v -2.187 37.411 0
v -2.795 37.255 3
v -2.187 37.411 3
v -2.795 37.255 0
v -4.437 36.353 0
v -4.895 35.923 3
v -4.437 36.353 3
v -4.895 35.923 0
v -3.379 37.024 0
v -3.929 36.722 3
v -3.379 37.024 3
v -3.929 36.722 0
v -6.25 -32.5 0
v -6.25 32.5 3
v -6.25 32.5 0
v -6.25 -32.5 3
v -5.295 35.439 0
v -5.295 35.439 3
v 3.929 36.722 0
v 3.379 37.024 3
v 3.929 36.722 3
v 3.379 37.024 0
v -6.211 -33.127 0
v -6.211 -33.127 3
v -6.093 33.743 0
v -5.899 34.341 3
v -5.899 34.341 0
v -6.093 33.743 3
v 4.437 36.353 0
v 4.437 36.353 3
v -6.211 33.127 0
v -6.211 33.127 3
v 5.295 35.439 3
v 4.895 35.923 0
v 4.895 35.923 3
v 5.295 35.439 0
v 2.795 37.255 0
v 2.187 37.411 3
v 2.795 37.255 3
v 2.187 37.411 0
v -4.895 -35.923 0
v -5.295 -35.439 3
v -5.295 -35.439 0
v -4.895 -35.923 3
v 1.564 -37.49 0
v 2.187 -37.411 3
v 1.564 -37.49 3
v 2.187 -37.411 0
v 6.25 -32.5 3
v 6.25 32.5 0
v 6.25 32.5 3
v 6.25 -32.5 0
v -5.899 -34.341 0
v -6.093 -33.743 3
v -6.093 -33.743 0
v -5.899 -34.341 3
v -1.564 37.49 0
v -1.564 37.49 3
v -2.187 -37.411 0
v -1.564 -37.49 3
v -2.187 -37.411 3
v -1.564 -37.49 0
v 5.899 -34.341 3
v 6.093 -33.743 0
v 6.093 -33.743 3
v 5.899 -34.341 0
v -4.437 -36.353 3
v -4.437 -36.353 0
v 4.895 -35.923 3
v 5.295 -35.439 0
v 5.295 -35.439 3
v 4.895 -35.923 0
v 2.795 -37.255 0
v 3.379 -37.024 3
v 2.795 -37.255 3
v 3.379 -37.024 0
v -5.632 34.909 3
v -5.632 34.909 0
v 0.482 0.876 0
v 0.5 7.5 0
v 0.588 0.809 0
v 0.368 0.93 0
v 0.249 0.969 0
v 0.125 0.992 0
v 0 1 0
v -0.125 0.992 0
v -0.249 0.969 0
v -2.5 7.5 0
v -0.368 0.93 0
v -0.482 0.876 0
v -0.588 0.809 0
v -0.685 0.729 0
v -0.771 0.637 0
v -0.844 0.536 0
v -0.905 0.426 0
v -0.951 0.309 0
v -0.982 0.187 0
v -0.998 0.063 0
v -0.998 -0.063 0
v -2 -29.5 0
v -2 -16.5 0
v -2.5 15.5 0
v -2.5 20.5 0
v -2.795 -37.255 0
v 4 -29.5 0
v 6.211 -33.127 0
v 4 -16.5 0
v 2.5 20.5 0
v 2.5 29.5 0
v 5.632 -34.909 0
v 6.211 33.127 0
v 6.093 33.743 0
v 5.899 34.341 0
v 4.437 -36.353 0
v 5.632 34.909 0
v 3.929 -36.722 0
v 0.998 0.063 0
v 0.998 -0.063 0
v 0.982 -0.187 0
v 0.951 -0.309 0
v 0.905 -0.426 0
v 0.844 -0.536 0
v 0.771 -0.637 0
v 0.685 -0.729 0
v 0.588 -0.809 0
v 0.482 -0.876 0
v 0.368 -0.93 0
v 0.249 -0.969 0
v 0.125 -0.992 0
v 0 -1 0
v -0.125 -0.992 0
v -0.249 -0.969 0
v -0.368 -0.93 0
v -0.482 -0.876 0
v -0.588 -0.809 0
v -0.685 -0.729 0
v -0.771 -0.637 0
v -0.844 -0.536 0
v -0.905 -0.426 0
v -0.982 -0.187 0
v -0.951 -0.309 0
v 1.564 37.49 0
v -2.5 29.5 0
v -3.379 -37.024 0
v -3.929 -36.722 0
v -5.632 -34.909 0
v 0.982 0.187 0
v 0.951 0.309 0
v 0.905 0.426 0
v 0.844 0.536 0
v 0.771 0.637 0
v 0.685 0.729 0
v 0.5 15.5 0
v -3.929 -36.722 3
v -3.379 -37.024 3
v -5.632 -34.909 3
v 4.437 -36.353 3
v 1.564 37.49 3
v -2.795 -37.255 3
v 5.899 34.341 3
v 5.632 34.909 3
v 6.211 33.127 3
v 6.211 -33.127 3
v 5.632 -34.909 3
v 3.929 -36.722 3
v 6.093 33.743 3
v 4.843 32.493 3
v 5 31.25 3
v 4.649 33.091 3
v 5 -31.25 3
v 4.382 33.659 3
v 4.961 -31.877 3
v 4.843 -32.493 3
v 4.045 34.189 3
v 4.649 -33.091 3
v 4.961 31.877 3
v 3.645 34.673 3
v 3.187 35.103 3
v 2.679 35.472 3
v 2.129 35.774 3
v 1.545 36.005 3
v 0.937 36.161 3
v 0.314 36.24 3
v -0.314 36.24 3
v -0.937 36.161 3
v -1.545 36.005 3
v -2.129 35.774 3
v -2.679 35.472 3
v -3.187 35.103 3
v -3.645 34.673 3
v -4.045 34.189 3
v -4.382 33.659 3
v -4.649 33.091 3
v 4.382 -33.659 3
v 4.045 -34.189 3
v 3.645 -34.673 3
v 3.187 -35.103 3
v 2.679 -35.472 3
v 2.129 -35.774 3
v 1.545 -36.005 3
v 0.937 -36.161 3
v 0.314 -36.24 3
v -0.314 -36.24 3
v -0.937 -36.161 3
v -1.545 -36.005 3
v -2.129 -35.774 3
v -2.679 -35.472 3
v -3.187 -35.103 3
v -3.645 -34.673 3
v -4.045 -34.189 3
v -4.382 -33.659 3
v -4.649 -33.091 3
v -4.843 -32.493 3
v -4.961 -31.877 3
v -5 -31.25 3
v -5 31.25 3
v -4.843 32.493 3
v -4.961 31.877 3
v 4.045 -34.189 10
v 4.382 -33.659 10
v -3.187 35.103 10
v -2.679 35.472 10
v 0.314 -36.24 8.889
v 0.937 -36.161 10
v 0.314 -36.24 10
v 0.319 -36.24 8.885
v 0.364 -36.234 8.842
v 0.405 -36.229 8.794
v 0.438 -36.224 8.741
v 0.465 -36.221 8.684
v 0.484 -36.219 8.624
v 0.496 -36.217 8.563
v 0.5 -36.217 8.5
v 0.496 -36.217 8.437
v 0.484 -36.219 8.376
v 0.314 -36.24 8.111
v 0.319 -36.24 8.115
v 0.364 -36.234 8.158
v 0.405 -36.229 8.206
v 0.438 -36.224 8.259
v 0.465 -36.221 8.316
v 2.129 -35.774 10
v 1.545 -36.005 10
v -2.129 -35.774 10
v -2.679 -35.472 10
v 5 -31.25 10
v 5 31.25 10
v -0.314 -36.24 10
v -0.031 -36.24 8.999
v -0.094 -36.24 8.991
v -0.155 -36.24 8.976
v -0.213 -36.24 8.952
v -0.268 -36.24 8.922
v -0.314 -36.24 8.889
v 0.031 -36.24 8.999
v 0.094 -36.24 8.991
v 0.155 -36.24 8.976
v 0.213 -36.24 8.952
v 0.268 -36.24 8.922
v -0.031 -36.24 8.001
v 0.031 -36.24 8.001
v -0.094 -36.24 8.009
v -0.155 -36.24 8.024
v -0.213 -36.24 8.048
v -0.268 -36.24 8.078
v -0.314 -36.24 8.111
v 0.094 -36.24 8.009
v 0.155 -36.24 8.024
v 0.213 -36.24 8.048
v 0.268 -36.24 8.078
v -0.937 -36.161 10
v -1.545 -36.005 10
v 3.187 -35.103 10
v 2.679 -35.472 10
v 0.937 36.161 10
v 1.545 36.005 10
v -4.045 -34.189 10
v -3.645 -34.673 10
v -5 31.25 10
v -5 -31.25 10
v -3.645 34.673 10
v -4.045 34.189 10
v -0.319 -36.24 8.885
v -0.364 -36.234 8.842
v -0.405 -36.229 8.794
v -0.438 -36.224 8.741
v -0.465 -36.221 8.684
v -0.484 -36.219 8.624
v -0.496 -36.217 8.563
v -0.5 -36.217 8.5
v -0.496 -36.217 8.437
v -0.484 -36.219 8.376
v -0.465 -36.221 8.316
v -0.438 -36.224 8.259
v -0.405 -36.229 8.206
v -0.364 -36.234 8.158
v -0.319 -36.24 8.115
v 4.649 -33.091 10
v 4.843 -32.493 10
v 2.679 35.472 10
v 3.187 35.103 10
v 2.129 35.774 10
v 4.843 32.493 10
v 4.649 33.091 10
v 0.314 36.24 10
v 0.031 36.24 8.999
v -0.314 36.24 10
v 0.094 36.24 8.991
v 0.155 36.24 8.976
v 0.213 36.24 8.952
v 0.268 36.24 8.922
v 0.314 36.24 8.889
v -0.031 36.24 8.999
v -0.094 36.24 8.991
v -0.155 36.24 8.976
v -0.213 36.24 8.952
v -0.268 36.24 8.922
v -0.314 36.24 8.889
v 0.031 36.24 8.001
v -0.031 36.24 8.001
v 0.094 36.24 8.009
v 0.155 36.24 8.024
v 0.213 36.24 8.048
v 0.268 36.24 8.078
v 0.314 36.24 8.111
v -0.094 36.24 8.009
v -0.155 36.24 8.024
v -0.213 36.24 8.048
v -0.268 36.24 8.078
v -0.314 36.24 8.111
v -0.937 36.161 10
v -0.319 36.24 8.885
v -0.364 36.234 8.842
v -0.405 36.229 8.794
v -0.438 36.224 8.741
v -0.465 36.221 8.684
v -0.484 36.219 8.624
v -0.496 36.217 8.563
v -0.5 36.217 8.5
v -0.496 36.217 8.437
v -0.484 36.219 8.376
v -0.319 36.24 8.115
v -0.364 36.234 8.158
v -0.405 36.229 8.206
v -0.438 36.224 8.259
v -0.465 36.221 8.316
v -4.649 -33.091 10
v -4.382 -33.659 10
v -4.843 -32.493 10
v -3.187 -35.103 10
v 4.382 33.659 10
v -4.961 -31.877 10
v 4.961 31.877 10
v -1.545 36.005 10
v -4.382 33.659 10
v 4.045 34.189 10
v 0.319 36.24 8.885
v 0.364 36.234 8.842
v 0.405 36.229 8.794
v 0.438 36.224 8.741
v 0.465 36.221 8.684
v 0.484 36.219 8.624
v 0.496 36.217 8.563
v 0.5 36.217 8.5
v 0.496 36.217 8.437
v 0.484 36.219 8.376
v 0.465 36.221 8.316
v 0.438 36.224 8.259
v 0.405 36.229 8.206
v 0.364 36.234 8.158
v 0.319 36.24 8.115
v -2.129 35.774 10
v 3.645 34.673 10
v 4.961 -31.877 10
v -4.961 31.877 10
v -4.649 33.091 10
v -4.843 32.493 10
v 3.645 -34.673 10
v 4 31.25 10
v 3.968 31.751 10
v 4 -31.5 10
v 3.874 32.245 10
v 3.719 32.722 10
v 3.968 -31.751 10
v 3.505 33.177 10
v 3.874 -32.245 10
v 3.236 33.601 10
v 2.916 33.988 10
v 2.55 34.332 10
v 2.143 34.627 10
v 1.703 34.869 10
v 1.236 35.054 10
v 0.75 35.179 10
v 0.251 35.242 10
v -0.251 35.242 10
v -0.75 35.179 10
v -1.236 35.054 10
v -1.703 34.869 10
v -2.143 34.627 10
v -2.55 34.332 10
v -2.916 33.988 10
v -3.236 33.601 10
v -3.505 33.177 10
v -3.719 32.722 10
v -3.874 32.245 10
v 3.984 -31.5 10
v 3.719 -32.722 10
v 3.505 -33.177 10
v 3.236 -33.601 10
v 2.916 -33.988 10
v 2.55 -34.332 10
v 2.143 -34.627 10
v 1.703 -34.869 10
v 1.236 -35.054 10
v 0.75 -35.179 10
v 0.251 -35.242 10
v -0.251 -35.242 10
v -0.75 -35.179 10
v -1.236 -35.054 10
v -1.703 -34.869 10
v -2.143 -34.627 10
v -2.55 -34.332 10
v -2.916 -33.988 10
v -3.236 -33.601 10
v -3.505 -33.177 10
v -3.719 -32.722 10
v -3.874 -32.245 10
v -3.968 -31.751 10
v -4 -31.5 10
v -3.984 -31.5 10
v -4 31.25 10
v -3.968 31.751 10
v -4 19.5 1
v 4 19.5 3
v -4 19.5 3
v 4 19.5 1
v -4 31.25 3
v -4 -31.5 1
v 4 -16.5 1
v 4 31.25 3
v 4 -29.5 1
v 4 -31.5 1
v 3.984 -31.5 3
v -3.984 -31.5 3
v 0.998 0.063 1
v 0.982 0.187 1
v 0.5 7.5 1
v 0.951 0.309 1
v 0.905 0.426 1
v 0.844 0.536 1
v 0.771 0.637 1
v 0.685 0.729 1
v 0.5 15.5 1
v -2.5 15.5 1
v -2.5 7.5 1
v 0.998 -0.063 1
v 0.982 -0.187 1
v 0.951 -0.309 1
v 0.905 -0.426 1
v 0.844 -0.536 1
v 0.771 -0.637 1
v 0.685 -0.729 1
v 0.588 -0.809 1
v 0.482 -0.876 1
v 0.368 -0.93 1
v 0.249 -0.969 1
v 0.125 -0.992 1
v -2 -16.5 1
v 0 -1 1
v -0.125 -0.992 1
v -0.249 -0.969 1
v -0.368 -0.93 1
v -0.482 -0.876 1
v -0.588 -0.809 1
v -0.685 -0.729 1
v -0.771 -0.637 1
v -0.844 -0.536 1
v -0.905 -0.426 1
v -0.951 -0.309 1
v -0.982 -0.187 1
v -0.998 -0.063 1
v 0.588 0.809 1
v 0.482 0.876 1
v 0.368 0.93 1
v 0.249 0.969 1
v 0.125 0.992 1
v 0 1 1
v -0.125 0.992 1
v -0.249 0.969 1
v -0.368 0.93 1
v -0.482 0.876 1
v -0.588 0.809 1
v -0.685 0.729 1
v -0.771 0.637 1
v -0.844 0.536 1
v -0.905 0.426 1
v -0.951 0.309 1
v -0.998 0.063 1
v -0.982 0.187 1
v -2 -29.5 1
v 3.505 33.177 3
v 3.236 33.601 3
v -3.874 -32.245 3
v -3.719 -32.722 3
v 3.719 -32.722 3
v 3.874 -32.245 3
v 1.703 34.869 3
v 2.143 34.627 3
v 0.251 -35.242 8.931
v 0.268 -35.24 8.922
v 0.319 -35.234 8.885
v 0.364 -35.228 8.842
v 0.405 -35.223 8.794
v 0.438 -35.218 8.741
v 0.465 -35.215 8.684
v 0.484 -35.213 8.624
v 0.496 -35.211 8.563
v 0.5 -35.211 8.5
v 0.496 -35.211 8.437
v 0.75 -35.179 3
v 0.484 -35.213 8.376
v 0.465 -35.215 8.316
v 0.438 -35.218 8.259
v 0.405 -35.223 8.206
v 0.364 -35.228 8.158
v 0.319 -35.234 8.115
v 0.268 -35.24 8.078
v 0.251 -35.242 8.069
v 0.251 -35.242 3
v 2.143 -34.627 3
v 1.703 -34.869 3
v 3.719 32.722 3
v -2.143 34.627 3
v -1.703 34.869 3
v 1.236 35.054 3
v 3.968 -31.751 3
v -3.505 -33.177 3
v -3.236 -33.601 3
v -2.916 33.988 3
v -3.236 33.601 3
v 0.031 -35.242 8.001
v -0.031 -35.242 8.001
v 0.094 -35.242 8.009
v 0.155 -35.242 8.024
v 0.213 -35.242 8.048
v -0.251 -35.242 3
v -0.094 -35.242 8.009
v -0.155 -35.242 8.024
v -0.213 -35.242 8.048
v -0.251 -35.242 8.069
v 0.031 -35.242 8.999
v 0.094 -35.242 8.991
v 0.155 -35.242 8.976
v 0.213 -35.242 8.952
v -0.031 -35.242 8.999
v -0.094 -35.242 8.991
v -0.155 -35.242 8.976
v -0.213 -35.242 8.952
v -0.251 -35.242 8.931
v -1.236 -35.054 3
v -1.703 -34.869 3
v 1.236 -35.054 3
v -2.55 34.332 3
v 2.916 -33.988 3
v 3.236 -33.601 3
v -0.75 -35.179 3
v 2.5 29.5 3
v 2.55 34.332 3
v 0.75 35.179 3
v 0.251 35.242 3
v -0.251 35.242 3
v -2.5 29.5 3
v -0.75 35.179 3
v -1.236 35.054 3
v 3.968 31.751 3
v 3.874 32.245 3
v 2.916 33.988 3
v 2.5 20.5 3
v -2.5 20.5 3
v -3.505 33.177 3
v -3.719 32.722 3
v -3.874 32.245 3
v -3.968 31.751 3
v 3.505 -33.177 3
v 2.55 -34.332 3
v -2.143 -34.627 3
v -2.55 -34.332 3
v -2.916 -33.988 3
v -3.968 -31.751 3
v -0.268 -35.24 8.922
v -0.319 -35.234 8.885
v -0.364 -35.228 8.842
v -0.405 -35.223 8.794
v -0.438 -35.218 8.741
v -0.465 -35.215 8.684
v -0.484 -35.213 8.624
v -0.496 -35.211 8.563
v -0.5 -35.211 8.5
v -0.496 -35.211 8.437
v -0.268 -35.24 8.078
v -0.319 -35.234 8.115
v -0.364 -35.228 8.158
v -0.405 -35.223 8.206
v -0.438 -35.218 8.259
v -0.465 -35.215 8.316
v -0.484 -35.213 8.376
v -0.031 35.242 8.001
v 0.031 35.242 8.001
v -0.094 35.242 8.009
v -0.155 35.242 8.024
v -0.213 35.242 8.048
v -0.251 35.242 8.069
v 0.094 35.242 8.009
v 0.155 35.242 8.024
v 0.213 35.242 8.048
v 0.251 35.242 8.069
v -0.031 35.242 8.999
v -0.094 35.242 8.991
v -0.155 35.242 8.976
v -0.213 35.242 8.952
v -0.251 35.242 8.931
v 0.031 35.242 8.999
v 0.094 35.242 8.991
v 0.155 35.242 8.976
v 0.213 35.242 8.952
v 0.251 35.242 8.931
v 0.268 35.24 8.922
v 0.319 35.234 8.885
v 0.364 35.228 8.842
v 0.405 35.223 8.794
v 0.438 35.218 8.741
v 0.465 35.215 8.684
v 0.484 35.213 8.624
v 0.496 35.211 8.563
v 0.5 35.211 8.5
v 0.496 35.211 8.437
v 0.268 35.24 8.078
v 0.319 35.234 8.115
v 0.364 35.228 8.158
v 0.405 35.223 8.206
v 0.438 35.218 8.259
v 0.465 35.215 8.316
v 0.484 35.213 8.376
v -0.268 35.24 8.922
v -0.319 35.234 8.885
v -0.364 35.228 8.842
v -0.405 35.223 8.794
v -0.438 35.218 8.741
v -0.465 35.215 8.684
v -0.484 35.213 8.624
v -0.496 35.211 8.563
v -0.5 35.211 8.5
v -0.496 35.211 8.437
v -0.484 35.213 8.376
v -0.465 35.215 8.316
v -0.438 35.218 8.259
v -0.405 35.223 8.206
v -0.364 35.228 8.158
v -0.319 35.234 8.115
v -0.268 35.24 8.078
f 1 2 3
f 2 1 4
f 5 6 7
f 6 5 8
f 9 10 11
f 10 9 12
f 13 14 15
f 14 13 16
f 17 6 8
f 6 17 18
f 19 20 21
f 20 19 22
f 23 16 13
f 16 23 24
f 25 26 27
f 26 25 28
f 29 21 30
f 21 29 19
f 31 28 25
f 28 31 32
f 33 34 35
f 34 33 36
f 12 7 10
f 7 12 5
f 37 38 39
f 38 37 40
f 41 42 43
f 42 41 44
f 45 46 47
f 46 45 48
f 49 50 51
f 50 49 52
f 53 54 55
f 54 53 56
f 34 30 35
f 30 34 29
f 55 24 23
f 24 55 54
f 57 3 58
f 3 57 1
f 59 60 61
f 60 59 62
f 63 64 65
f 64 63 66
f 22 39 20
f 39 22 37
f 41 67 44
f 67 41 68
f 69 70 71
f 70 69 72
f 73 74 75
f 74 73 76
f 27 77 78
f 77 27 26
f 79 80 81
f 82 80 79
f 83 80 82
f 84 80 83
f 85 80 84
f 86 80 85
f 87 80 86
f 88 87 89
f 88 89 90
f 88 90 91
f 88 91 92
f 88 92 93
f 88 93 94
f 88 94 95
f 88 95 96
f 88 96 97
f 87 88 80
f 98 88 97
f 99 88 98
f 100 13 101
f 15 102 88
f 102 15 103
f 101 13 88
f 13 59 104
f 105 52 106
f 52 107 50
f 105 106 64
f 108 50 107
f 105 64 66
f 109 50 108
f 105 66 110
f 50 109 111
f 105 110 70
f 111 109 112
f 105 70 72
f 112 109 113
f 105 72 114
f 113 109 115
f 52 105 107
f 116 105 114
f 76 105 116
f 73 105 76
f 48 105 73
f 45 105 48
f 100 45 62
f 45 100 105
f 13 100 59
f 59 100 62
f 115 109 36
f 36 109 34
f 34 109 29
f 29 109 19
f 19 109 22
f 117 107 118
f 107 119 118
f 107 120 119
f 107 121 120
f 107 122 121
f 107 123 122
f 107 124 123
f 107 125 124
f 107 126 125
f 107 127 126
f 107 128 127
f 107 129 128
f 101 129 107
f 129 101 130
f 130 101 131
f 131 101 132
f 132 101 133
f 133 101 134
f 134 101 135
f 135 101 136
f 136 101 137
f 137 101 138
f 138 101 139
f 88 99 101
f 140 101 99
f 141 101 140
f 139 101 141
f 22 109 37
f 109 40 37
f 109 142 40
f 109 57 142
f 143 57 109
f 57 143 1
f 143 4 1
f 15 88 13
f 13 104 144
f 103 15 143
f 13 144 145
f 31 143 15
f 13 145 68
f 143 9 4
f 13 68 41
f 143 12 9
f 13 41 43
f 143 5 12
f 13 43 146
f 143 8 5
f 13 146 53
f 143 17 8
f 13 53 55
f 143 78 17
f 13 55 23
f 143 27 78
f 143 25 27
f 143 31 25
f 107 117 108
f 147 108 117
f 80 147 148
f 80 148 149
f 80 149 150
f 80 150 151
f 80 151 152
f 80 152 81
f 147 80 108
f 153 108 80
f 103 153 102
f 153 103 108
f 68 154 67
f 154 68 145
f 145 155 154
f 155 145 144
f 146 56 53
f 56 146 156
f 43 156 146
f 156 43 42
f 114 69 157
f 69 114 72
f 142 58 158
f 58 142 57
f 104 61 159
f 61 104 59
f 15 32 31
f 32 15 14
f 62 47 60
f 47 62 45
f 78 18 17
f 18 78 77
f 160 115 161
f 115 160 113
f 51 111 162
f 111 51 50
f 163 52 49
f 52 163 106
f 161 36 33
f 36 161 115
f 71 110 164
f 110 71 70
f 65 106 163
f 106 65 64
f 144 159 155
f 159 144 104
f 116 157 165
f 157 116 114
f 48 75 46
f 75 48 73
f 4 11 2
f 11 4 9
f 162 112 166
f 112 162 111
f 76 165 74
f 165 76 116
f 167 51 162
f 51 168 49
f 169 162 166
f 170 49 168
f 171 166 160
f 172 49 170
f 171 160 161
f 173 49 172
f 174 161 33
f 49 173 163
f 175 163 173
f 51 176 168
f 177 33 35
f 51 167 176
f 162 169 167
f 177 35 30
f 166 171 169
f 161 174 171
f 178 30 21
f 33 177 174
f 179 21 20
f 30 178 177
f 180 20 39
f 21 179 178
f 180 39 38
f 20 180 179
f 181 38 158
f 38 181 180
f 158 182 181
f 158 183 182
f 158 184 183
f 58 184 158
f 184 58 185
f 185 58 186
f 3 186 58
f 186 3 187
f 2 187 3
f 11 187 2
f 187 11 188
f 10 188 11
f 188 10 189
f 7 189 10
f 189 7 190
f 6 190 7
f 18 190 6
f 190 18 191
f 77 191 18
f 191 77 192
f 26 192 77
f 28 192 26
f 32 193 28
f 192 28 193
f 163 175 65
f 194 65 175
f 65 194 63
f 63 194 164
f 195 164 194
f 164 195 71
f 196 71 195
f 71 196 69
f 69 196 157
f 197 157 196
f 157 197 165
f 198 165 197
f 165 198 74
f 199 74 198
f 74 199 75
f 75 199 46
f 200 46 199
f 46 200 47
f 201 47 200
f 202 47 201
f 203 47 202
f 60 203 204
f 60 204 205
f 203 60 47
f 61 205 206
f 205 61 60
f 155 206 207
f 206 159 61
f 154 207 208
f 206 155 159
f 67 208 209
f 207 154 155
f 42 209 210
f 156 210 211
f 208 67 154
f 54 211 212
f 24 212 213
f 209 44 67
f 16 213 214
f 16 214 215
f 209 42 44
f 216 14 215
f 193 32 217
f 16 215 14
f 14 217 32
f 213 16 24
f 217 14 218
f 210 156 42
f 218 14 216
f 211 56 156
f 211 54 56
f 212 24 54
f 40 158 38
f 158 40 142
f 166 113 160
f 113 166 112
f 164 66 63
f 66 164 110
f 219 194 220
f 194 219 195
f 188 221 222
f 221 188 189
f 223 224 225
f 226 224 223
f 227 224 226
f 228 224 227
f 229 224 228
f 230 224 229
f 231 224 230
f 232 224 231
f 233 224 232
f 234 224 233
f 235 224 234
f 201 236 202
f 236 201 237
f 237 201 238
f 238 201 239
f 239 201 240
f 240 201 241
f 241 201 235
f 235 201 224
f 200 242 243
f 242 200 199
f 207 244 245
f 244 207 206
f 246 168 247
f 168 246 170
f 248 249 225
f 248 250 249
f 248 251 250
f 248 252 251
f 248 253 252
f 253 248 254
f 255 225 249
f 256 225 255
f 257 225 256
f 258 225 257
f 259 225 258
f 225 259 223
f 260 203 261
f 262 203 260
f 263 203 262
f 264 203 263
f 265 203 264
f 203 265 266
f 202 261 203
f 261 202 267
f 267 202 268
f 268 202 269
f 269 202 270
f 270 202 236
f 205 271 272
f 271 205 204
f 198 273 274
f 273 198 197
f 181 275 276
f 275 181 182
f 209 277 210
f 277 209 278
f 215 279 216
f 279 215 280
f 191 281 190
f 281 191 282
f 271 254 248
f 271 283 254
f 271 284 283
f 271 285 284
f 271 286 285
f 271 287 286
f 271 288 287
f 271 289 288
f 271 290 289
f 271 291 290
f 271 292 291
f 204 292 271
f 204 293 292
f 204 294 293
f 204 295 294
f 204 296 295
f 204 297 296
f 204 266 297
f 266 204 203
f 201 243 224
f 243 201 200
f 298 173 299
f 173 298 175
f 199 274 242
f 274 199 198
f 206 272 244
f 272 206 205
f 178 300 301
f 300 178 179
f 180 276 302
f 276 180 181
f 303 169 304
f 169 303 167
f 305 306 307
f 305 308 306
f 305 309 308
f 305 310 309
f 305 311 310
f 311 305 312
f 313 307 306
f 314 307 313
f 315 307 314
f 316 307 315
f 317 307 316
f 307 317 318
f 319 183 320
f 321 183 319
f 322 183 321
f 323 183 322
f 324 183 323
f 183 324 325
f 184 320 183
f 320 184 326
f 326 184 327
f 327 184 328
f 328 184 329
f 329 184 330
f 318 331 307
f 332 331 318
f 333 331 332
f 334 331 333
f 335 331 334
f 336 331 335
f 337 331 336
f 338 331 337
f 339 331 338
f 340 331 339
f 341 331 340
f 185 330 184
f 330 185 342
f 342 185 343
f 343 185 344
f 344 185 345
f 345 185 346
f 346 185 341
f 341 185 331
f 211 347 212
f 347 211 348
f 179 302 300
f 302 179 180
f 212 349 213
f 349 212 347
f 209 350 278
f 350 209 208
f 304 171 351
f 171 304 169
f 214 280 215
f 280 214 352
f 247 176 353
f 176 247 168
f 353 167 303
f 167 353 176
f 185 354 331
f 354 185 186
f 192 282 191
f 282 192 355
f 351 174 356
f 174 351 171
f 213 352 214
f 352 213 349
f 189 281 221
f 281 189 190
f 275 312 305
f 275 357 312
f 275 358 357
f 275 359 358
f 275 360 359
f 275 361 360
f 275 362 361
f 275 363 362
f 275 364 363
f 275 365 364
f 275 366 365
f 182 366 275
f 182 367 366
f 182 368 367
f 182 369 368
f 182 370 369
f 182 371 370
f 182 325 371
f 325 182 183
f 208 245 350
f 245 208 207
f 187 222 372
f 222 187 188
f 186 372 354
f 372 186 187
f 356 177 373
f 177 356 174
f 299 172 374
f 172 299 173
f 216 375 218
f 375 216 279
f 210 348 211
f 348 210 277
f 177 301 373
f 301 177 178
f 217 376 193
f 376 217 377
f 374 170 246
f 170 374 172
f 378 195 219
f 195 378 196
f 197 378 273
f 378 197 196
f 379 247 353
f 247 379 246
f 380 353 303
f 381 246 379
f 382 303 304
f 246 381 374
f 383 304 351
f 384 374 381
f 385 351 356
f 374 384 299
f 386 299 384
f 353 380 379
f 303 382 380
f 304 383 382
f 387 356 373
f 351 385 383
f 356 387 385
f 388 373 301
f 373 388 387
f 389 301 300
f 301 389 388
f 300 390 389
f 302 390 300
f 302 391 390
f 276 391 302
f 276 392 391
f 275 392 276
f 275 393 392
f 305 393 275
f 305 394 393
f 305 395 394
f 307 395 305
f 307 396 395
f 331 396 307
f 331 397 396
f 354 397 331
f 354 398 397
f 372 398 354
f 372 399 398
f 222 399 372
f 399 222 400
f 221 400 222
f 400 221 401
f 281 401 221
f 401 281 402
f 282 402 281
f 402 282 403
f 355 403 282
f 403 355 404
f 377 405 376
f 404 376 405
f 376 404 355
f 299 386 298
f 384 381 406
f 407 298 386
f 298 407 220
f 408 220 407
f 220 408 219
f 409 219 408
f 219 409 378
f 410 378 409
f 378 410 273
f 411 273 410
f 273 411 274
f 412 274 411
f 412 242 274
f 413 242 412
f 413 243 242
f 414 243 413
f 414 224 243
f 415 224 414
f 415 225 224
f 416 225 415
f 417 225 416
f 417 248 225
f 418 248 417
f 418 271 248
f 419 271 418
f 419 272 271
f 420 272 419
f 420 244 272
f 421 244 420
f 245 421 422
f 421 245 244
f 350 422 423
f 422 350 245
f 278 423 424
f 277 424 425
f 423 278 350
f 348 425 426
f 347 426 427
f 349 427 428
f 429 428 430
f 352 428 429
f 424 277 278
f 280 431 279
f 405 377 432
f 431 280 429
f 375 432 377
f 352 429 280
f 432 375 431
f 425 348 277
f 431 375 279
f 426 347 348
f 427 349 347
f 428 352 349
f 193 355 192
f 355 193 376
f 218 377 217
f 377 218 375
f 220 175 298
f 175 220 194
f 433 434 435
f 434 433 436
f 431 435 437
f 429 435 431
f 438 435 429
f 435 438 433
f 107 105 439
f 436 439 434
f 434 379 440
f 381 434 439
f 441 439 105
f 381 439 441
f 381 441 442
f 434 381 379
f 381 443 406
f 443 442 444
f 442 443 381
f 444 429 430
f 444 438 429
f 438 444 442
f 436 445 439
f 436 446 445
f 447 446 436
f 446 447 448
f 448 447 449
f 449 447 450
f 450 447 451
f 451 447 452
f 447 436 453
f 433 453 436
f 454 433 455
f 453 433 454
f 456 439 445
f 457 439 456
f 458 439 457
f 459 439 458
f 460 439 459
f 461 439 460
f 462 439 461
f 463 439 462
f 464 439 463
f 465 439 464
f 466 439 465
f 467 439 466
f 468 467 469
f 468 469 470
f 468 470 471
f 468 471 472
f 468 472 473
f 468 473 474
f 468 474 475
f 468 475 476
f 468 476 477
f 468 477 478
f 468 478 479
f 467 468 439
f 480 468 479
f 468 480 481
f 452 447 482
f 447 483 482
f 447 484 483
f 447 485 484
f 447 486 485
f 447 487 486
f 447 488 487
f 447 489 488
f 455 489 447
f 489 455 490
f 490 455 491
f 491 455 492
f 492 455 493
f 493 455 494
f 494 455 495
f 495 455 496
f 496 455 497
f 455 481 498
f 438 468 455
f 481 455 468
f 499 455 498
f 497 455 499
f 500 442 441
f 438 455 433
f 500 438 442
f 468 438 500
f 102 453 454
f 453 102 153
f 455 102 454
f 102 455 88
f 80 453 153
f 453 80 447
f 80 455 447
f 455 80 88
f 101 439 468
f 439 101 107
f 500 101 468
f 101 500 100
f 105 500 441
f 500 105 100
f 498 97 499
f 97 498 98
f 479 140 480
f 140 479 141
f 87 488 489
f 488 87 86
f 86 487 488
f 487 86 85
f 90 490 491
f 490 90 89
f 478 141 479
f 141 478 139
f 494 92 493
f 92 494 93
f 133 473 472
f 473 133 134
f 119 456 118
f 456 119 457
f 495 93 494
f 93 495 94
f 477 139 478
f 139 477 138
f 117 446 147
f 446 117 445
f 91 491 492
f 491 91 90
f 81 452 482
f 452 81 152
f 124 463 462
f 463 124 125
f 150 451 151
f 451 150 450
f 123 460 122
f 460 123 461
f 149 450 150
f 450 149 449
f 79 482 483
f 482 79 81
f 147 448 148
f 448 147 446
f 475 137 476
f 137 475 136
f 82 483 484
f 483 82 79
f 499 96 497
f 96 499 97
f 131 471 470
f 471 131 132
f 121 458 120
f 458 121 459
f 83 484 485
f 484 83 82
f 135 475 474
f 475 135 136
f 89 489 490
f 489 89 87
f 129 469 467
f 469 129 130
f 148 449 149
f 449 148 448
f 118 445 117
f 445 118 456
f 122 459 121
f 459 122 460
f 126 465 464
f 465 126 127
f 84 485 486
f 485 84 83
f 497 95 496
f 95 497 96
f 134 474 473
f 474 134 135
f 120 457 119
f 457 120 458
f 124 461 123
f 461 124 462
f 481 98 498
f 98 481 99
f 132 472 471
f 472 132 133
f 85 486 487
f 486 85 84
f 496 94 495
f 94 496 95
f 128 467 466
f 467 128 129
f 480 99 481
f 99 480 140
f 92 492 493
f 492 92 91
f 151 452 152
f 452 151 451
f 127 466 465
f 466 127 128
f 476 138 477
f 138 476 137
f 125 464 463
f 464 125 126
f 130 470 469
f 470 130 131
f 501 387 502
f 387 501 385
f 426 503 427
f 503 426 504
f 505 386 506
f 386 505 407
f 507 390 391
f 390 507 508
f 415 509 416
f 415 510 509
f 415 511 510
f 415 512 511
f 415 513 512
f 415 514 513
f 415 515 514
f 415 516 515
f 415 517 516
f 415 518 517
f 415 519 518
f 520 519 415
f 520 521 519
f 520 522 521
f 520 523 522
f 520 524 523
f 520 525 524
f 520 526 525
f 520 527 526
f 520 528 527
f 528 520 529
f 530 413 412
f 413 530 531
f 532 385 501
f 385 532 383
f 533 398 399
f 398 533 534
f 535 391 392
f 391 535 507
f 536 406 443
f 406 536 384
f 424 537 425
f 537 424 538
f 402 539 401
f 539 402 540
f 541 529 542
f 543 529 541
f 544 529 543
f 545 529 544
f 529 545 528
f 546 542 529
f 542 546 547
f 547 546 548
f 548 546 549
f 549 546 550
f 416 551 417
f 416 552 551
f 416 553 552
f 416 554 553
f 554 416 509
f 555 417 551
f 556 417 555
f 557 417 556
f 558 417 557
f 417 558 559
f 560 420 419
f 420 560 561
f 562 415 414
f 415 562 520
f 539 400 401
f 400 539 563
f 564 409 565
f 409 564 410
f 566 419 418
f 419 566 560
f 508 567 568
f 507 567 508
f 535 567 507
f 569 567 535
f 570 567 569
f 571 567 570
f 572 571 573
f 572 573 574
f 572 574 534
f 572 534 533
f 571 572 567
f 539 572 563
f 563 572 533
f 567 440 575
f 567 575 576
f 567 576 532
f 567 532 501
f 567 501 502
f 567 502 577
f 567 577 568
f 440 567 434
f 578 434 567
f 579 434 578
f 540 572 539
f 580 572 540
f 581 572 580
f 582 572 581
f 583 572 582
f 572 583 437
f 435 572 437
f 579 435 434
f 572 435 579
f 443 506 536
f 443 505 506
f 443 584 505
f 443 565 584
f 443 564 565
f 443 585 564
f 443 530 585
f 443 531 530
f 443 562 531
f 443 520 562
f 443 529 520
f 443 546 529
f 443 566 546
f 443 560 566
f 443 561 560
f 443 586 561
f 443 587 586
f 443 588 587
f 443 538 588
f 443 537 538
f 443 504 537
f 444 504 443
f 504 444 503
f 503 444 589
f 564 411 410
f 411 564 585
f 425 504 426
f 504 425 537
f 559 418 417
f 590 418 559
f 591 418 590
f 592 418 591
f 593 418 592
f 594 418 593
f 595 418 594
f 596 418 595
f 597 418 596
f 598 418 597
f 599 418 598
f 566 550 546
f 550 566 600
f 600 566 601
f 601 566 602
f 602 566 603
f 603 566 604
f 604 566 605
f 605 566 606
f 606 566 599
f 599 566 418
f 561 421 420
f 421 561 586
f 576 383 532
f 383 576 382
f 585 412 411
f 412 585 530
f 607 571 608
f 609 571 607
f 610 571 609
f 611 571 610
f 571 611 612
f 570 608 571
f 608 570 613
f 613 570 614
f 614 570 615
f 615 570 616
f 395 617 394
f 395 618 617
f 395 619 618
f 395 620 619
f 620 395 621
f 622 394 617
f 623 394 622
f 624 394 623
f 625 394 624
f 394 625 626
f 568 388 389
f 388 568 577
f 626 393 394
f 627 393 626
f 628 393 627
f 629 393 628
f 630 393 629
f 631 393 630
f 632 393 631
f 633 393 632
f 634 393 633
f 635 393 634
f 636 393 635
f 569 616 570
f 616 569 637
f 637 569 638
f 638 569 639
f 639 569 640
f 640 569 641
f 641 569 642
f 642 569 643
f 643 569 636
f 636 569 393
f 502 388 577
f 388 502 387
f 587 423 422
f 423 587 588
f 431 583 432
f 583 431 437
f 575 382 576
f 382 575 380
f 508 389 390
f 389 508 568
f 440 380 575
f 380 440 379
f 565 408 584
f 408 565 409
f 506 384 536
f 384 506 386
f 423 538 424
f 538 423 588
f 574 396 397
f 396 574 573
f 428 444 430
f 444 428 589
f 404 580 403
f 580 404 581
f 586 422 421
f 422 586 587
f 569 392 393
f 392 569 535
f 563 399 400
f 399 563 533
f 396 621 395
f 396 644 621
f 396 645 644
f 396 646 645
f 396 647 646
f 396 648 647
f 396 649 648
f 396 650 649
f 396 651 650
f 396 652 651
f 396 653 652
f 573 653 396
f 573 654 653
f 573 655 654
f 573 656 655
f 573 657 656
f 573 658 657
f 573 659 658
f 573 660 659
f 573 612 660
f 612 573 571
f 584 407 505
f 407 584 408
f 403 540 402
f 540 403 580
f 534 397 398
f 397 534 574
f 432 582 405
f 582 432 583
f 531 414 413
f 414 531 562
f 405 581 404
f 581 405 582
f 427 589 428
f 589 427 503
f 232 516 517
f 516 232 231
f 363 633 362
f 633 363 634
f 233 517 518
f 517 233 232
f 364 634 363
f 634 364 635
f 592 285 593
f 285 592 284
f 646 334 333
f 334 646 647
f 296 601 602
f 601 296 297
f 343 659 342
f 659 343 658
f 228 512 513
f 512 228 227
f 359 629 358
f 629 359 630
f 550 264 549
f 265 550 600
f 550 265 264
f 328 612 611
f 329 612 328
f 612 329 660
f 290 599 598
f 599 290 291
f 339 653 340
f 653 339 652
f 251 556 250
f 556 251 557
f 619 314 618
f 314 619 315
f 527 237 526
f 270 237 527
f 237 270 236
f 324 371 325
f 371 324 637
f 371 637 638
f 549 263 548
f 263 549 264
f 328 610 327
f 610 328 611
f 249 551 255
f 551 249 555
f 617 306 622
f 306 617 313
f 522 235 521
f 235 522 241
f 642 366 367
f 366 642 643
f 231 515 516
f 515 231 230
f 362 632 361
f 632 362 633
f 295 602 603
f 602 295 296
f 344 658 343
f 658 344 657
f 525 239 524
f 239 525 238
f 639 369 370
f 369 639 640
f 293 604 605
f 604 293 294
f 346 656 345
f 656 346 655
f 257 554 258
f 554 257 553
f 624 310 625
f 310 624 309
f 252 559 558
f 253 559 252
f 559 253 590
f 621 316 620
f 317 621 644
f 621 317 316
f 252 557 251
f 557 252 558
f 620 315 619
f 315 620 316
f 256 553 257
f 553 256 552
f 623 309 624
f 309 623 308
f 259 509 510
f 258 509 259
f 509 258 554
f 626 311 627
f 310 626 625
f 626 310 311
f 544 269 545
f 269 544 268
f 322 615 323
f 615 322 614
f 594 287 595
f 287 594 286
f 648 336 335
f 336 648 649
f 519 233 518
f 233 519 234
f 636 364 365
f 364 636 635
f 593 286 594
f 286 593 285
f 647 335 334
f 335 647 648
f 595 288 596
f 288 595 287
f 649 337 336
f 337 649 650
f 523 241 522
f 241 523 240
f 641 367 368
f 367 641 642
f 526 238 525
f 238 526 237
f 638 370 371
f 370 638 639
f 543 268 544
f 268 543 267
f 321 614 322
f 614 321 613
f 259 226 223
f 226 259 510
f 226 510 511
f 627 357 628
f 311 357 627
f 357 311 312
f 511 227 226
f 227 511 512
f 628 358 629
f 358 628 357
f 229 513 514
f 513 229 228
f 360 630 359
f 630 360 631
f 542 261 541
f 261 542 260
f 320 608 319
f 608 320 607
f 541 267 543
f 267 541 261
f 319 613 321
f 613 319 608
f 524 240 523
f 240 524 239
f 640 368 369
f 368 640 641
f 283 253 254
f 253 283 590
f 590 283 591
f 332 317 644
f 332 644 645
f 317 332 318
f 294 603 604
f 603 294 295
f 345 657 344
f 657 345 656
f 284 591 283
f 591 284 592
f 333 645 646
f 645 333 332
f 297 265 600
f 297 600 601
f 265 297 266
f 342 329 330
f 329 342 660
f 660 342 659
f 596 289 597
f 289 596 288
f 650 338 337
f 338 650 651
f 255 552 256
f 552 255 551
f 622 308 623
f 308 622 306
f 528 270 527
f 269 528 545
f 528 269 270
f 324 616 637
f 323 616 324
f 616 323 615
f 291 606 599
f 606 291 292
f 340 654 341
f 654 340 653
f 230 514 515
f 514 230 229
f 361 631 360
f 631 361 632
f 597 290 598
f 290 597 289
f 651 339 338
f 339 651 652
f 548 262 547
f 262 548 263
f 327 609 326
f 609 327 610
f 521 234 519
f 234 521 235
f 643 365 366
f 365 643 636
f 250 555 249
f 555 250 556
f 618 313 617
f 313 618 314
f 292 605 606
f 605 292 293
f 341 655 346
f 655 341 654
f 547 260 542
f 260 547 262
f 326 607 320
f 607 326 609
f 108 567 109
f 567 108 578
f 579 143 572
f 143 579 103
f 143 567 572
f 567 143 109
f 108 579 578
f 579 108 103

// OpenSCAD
OUTER_WIDTH = 75;
OUTER_HEIGHT = 12.5;

INNER_WIDTH = 72.5;
INNER_HEIGHT = 10;

INSIDE_THICKNESS = 10;
PANEL_THICKNESS = 3;
WALL_THICKNESS = 1;

CORNER_DIA = 10;

MOUNT_HOLE_HEIGHT = 8.5;
MOUNT_HOLE_DIA = 1;

PSU_LENGTH = 21;
PSU_WIDTH = 51;
PSU_THICKNESS = INNER_HEIGHT - 2 * WALL_THICKNESS;

USB_THICKNESS = 6;
USB_WIDTH = 13;
USB_OFFSET_X = PSU_WIDTH/2 - 8.5;
USB_OFFSET_Z = 5;

MICRO_THICKNESS = 3;
MICRO_WIDTH = 8;
MICRO_OFFSET_X = PSU_WIDTH/2 - 8;
MICRO_OFFSET_Z = 3;

LED_HOLE_DIA = 2;
LED_HOLE_OFFSET_X = 31.5 - PSU_WIDTH/2;
LED_HOLE_OFFSET_Z = PSU_THICKNESS/2;

PANEL_OFFSET_Z = WALL_THICKNESS;
PANEL_OFFSET_Y = -6;

CONNECTOR_WIDTH = 9;
CONNECTOR_HEIGHT = 5;
CONNECTOR_OFFSET = 25;

$fn = 50;

module rounded_rect(width, length, height, corner_dia) {
  hull() {
    for(i = [-1, 1]) {
      for(j = [-1, 1]) {
        translate([i * (width - corner_dia)/2, j * (length - corner_dia)/2, 0])
        cylinder(d = corner_dia, h = height);
      }
    }
  }
}

module mount_holes() {
  translate([0, 0, MOUNT_HOLE_HEIGHT])
  rotate([90, 0, 0])
  cylinder(d = MOUNT_HOLE_DIA, h = OUTER_WIDTH, center = true);
}

module psu() {
  translate([-PSU_WIDTH/2, -PSU_LENGTH/2, 0])
  cube(size = [PSU_WIDTH, PSU_LENGTH, PSU_THICKNESS]);
  translate([-MICRO_WIDTH/2 + MICRO_OFFSET_X, PSU_LENGTH/2, -MICRO_THICKNESS/2 + PSU_THICKNESS - MICRO_OFFSET_Z])
  cube(size = [MICRO_WIDTH, PANEL_THICKNESS, MICRO_THICKNESS]);

  translate([-USB_WIDTH/2 - USB_OFFSET_X, PSU_LENGTH/2, -USB_THICKNESS/2 + PSU_THICKNESS - USB_OFFSET_Z])
  cube(size = [USB_WIDTH, PANEL_THICKNESS, USB_THICKNESS]);

  translate([LED_HOLE_OFFSET_X, 0, LED_HOLE_OFFSET_Z])
  rotate([90, 0, 0])
  cylinder(d = LED_HOLE_DIA, h = PSU_LENGTH + 2 * PANEL_THICKNESS, center = true);
}

module solar_connector() {
  translate([-CONNECTOR_HEIGHT/2, -CONNECTOR_WIDTH/2, 0])
  cube(size = [CONNECTOR_HEIGHT, CONNECTOR_WIDTH, INNER_HEIGHT]);
}

module front_panel() {
  difference() {
    union() {
      rounded_rect(OUTER_HEIGHT, OUTER_WIDTH, PANEL_THICKNESS, CORNER_DIA);
      rounded_rect(INNER_HEIGHT, INNER_WIDTH, INSIDE_THICKNESS, CORNER_DIA);
    }

    wt = 2 * WALL_THICKNESS;
    #translate([0, 0, PANEL_THICKNESS])
    rounded_rect(INNER_HEIGHT - wt, INNER_WIDTH - wt, INSIDE_THICKNESS, CORNER_DIA - wt);

    #mount_holes();

    #translate([PSU_THICKNESS/2, PANEL_OFFSET_Y, PSU_LENGTH/2 + PANEL_OFFSET_Z])
    rotate([-90, 0, 90])
    psu();

    #translate([0, CONNECTOR_OFFSET, 0])
    solar_connector();
  }
}

module back_panel() {
  difference() {
    union() {
      rounded_rect(OUTER_HEIGHT, OUTER_WIDTH, PANEL_THICKNESS, CORNER_DIA);
      rounded_rect(INNER_HEIGHT, INNER_WIDTH, INSIDE_THICKNESS, CORNER_DIA);
    }

    wt = 2 * WALL_THICKNESS;
    #translate([0, 0, PANEL_THICKNESS])
    rounded_rect(INNER_HEIGHT - wt, INNER_WIDTH - wt, INSIDE_THICKNESS, CORNER_DIA - wt);

    #mount_holes();
  }
}

front_panel();

//back_panel();
